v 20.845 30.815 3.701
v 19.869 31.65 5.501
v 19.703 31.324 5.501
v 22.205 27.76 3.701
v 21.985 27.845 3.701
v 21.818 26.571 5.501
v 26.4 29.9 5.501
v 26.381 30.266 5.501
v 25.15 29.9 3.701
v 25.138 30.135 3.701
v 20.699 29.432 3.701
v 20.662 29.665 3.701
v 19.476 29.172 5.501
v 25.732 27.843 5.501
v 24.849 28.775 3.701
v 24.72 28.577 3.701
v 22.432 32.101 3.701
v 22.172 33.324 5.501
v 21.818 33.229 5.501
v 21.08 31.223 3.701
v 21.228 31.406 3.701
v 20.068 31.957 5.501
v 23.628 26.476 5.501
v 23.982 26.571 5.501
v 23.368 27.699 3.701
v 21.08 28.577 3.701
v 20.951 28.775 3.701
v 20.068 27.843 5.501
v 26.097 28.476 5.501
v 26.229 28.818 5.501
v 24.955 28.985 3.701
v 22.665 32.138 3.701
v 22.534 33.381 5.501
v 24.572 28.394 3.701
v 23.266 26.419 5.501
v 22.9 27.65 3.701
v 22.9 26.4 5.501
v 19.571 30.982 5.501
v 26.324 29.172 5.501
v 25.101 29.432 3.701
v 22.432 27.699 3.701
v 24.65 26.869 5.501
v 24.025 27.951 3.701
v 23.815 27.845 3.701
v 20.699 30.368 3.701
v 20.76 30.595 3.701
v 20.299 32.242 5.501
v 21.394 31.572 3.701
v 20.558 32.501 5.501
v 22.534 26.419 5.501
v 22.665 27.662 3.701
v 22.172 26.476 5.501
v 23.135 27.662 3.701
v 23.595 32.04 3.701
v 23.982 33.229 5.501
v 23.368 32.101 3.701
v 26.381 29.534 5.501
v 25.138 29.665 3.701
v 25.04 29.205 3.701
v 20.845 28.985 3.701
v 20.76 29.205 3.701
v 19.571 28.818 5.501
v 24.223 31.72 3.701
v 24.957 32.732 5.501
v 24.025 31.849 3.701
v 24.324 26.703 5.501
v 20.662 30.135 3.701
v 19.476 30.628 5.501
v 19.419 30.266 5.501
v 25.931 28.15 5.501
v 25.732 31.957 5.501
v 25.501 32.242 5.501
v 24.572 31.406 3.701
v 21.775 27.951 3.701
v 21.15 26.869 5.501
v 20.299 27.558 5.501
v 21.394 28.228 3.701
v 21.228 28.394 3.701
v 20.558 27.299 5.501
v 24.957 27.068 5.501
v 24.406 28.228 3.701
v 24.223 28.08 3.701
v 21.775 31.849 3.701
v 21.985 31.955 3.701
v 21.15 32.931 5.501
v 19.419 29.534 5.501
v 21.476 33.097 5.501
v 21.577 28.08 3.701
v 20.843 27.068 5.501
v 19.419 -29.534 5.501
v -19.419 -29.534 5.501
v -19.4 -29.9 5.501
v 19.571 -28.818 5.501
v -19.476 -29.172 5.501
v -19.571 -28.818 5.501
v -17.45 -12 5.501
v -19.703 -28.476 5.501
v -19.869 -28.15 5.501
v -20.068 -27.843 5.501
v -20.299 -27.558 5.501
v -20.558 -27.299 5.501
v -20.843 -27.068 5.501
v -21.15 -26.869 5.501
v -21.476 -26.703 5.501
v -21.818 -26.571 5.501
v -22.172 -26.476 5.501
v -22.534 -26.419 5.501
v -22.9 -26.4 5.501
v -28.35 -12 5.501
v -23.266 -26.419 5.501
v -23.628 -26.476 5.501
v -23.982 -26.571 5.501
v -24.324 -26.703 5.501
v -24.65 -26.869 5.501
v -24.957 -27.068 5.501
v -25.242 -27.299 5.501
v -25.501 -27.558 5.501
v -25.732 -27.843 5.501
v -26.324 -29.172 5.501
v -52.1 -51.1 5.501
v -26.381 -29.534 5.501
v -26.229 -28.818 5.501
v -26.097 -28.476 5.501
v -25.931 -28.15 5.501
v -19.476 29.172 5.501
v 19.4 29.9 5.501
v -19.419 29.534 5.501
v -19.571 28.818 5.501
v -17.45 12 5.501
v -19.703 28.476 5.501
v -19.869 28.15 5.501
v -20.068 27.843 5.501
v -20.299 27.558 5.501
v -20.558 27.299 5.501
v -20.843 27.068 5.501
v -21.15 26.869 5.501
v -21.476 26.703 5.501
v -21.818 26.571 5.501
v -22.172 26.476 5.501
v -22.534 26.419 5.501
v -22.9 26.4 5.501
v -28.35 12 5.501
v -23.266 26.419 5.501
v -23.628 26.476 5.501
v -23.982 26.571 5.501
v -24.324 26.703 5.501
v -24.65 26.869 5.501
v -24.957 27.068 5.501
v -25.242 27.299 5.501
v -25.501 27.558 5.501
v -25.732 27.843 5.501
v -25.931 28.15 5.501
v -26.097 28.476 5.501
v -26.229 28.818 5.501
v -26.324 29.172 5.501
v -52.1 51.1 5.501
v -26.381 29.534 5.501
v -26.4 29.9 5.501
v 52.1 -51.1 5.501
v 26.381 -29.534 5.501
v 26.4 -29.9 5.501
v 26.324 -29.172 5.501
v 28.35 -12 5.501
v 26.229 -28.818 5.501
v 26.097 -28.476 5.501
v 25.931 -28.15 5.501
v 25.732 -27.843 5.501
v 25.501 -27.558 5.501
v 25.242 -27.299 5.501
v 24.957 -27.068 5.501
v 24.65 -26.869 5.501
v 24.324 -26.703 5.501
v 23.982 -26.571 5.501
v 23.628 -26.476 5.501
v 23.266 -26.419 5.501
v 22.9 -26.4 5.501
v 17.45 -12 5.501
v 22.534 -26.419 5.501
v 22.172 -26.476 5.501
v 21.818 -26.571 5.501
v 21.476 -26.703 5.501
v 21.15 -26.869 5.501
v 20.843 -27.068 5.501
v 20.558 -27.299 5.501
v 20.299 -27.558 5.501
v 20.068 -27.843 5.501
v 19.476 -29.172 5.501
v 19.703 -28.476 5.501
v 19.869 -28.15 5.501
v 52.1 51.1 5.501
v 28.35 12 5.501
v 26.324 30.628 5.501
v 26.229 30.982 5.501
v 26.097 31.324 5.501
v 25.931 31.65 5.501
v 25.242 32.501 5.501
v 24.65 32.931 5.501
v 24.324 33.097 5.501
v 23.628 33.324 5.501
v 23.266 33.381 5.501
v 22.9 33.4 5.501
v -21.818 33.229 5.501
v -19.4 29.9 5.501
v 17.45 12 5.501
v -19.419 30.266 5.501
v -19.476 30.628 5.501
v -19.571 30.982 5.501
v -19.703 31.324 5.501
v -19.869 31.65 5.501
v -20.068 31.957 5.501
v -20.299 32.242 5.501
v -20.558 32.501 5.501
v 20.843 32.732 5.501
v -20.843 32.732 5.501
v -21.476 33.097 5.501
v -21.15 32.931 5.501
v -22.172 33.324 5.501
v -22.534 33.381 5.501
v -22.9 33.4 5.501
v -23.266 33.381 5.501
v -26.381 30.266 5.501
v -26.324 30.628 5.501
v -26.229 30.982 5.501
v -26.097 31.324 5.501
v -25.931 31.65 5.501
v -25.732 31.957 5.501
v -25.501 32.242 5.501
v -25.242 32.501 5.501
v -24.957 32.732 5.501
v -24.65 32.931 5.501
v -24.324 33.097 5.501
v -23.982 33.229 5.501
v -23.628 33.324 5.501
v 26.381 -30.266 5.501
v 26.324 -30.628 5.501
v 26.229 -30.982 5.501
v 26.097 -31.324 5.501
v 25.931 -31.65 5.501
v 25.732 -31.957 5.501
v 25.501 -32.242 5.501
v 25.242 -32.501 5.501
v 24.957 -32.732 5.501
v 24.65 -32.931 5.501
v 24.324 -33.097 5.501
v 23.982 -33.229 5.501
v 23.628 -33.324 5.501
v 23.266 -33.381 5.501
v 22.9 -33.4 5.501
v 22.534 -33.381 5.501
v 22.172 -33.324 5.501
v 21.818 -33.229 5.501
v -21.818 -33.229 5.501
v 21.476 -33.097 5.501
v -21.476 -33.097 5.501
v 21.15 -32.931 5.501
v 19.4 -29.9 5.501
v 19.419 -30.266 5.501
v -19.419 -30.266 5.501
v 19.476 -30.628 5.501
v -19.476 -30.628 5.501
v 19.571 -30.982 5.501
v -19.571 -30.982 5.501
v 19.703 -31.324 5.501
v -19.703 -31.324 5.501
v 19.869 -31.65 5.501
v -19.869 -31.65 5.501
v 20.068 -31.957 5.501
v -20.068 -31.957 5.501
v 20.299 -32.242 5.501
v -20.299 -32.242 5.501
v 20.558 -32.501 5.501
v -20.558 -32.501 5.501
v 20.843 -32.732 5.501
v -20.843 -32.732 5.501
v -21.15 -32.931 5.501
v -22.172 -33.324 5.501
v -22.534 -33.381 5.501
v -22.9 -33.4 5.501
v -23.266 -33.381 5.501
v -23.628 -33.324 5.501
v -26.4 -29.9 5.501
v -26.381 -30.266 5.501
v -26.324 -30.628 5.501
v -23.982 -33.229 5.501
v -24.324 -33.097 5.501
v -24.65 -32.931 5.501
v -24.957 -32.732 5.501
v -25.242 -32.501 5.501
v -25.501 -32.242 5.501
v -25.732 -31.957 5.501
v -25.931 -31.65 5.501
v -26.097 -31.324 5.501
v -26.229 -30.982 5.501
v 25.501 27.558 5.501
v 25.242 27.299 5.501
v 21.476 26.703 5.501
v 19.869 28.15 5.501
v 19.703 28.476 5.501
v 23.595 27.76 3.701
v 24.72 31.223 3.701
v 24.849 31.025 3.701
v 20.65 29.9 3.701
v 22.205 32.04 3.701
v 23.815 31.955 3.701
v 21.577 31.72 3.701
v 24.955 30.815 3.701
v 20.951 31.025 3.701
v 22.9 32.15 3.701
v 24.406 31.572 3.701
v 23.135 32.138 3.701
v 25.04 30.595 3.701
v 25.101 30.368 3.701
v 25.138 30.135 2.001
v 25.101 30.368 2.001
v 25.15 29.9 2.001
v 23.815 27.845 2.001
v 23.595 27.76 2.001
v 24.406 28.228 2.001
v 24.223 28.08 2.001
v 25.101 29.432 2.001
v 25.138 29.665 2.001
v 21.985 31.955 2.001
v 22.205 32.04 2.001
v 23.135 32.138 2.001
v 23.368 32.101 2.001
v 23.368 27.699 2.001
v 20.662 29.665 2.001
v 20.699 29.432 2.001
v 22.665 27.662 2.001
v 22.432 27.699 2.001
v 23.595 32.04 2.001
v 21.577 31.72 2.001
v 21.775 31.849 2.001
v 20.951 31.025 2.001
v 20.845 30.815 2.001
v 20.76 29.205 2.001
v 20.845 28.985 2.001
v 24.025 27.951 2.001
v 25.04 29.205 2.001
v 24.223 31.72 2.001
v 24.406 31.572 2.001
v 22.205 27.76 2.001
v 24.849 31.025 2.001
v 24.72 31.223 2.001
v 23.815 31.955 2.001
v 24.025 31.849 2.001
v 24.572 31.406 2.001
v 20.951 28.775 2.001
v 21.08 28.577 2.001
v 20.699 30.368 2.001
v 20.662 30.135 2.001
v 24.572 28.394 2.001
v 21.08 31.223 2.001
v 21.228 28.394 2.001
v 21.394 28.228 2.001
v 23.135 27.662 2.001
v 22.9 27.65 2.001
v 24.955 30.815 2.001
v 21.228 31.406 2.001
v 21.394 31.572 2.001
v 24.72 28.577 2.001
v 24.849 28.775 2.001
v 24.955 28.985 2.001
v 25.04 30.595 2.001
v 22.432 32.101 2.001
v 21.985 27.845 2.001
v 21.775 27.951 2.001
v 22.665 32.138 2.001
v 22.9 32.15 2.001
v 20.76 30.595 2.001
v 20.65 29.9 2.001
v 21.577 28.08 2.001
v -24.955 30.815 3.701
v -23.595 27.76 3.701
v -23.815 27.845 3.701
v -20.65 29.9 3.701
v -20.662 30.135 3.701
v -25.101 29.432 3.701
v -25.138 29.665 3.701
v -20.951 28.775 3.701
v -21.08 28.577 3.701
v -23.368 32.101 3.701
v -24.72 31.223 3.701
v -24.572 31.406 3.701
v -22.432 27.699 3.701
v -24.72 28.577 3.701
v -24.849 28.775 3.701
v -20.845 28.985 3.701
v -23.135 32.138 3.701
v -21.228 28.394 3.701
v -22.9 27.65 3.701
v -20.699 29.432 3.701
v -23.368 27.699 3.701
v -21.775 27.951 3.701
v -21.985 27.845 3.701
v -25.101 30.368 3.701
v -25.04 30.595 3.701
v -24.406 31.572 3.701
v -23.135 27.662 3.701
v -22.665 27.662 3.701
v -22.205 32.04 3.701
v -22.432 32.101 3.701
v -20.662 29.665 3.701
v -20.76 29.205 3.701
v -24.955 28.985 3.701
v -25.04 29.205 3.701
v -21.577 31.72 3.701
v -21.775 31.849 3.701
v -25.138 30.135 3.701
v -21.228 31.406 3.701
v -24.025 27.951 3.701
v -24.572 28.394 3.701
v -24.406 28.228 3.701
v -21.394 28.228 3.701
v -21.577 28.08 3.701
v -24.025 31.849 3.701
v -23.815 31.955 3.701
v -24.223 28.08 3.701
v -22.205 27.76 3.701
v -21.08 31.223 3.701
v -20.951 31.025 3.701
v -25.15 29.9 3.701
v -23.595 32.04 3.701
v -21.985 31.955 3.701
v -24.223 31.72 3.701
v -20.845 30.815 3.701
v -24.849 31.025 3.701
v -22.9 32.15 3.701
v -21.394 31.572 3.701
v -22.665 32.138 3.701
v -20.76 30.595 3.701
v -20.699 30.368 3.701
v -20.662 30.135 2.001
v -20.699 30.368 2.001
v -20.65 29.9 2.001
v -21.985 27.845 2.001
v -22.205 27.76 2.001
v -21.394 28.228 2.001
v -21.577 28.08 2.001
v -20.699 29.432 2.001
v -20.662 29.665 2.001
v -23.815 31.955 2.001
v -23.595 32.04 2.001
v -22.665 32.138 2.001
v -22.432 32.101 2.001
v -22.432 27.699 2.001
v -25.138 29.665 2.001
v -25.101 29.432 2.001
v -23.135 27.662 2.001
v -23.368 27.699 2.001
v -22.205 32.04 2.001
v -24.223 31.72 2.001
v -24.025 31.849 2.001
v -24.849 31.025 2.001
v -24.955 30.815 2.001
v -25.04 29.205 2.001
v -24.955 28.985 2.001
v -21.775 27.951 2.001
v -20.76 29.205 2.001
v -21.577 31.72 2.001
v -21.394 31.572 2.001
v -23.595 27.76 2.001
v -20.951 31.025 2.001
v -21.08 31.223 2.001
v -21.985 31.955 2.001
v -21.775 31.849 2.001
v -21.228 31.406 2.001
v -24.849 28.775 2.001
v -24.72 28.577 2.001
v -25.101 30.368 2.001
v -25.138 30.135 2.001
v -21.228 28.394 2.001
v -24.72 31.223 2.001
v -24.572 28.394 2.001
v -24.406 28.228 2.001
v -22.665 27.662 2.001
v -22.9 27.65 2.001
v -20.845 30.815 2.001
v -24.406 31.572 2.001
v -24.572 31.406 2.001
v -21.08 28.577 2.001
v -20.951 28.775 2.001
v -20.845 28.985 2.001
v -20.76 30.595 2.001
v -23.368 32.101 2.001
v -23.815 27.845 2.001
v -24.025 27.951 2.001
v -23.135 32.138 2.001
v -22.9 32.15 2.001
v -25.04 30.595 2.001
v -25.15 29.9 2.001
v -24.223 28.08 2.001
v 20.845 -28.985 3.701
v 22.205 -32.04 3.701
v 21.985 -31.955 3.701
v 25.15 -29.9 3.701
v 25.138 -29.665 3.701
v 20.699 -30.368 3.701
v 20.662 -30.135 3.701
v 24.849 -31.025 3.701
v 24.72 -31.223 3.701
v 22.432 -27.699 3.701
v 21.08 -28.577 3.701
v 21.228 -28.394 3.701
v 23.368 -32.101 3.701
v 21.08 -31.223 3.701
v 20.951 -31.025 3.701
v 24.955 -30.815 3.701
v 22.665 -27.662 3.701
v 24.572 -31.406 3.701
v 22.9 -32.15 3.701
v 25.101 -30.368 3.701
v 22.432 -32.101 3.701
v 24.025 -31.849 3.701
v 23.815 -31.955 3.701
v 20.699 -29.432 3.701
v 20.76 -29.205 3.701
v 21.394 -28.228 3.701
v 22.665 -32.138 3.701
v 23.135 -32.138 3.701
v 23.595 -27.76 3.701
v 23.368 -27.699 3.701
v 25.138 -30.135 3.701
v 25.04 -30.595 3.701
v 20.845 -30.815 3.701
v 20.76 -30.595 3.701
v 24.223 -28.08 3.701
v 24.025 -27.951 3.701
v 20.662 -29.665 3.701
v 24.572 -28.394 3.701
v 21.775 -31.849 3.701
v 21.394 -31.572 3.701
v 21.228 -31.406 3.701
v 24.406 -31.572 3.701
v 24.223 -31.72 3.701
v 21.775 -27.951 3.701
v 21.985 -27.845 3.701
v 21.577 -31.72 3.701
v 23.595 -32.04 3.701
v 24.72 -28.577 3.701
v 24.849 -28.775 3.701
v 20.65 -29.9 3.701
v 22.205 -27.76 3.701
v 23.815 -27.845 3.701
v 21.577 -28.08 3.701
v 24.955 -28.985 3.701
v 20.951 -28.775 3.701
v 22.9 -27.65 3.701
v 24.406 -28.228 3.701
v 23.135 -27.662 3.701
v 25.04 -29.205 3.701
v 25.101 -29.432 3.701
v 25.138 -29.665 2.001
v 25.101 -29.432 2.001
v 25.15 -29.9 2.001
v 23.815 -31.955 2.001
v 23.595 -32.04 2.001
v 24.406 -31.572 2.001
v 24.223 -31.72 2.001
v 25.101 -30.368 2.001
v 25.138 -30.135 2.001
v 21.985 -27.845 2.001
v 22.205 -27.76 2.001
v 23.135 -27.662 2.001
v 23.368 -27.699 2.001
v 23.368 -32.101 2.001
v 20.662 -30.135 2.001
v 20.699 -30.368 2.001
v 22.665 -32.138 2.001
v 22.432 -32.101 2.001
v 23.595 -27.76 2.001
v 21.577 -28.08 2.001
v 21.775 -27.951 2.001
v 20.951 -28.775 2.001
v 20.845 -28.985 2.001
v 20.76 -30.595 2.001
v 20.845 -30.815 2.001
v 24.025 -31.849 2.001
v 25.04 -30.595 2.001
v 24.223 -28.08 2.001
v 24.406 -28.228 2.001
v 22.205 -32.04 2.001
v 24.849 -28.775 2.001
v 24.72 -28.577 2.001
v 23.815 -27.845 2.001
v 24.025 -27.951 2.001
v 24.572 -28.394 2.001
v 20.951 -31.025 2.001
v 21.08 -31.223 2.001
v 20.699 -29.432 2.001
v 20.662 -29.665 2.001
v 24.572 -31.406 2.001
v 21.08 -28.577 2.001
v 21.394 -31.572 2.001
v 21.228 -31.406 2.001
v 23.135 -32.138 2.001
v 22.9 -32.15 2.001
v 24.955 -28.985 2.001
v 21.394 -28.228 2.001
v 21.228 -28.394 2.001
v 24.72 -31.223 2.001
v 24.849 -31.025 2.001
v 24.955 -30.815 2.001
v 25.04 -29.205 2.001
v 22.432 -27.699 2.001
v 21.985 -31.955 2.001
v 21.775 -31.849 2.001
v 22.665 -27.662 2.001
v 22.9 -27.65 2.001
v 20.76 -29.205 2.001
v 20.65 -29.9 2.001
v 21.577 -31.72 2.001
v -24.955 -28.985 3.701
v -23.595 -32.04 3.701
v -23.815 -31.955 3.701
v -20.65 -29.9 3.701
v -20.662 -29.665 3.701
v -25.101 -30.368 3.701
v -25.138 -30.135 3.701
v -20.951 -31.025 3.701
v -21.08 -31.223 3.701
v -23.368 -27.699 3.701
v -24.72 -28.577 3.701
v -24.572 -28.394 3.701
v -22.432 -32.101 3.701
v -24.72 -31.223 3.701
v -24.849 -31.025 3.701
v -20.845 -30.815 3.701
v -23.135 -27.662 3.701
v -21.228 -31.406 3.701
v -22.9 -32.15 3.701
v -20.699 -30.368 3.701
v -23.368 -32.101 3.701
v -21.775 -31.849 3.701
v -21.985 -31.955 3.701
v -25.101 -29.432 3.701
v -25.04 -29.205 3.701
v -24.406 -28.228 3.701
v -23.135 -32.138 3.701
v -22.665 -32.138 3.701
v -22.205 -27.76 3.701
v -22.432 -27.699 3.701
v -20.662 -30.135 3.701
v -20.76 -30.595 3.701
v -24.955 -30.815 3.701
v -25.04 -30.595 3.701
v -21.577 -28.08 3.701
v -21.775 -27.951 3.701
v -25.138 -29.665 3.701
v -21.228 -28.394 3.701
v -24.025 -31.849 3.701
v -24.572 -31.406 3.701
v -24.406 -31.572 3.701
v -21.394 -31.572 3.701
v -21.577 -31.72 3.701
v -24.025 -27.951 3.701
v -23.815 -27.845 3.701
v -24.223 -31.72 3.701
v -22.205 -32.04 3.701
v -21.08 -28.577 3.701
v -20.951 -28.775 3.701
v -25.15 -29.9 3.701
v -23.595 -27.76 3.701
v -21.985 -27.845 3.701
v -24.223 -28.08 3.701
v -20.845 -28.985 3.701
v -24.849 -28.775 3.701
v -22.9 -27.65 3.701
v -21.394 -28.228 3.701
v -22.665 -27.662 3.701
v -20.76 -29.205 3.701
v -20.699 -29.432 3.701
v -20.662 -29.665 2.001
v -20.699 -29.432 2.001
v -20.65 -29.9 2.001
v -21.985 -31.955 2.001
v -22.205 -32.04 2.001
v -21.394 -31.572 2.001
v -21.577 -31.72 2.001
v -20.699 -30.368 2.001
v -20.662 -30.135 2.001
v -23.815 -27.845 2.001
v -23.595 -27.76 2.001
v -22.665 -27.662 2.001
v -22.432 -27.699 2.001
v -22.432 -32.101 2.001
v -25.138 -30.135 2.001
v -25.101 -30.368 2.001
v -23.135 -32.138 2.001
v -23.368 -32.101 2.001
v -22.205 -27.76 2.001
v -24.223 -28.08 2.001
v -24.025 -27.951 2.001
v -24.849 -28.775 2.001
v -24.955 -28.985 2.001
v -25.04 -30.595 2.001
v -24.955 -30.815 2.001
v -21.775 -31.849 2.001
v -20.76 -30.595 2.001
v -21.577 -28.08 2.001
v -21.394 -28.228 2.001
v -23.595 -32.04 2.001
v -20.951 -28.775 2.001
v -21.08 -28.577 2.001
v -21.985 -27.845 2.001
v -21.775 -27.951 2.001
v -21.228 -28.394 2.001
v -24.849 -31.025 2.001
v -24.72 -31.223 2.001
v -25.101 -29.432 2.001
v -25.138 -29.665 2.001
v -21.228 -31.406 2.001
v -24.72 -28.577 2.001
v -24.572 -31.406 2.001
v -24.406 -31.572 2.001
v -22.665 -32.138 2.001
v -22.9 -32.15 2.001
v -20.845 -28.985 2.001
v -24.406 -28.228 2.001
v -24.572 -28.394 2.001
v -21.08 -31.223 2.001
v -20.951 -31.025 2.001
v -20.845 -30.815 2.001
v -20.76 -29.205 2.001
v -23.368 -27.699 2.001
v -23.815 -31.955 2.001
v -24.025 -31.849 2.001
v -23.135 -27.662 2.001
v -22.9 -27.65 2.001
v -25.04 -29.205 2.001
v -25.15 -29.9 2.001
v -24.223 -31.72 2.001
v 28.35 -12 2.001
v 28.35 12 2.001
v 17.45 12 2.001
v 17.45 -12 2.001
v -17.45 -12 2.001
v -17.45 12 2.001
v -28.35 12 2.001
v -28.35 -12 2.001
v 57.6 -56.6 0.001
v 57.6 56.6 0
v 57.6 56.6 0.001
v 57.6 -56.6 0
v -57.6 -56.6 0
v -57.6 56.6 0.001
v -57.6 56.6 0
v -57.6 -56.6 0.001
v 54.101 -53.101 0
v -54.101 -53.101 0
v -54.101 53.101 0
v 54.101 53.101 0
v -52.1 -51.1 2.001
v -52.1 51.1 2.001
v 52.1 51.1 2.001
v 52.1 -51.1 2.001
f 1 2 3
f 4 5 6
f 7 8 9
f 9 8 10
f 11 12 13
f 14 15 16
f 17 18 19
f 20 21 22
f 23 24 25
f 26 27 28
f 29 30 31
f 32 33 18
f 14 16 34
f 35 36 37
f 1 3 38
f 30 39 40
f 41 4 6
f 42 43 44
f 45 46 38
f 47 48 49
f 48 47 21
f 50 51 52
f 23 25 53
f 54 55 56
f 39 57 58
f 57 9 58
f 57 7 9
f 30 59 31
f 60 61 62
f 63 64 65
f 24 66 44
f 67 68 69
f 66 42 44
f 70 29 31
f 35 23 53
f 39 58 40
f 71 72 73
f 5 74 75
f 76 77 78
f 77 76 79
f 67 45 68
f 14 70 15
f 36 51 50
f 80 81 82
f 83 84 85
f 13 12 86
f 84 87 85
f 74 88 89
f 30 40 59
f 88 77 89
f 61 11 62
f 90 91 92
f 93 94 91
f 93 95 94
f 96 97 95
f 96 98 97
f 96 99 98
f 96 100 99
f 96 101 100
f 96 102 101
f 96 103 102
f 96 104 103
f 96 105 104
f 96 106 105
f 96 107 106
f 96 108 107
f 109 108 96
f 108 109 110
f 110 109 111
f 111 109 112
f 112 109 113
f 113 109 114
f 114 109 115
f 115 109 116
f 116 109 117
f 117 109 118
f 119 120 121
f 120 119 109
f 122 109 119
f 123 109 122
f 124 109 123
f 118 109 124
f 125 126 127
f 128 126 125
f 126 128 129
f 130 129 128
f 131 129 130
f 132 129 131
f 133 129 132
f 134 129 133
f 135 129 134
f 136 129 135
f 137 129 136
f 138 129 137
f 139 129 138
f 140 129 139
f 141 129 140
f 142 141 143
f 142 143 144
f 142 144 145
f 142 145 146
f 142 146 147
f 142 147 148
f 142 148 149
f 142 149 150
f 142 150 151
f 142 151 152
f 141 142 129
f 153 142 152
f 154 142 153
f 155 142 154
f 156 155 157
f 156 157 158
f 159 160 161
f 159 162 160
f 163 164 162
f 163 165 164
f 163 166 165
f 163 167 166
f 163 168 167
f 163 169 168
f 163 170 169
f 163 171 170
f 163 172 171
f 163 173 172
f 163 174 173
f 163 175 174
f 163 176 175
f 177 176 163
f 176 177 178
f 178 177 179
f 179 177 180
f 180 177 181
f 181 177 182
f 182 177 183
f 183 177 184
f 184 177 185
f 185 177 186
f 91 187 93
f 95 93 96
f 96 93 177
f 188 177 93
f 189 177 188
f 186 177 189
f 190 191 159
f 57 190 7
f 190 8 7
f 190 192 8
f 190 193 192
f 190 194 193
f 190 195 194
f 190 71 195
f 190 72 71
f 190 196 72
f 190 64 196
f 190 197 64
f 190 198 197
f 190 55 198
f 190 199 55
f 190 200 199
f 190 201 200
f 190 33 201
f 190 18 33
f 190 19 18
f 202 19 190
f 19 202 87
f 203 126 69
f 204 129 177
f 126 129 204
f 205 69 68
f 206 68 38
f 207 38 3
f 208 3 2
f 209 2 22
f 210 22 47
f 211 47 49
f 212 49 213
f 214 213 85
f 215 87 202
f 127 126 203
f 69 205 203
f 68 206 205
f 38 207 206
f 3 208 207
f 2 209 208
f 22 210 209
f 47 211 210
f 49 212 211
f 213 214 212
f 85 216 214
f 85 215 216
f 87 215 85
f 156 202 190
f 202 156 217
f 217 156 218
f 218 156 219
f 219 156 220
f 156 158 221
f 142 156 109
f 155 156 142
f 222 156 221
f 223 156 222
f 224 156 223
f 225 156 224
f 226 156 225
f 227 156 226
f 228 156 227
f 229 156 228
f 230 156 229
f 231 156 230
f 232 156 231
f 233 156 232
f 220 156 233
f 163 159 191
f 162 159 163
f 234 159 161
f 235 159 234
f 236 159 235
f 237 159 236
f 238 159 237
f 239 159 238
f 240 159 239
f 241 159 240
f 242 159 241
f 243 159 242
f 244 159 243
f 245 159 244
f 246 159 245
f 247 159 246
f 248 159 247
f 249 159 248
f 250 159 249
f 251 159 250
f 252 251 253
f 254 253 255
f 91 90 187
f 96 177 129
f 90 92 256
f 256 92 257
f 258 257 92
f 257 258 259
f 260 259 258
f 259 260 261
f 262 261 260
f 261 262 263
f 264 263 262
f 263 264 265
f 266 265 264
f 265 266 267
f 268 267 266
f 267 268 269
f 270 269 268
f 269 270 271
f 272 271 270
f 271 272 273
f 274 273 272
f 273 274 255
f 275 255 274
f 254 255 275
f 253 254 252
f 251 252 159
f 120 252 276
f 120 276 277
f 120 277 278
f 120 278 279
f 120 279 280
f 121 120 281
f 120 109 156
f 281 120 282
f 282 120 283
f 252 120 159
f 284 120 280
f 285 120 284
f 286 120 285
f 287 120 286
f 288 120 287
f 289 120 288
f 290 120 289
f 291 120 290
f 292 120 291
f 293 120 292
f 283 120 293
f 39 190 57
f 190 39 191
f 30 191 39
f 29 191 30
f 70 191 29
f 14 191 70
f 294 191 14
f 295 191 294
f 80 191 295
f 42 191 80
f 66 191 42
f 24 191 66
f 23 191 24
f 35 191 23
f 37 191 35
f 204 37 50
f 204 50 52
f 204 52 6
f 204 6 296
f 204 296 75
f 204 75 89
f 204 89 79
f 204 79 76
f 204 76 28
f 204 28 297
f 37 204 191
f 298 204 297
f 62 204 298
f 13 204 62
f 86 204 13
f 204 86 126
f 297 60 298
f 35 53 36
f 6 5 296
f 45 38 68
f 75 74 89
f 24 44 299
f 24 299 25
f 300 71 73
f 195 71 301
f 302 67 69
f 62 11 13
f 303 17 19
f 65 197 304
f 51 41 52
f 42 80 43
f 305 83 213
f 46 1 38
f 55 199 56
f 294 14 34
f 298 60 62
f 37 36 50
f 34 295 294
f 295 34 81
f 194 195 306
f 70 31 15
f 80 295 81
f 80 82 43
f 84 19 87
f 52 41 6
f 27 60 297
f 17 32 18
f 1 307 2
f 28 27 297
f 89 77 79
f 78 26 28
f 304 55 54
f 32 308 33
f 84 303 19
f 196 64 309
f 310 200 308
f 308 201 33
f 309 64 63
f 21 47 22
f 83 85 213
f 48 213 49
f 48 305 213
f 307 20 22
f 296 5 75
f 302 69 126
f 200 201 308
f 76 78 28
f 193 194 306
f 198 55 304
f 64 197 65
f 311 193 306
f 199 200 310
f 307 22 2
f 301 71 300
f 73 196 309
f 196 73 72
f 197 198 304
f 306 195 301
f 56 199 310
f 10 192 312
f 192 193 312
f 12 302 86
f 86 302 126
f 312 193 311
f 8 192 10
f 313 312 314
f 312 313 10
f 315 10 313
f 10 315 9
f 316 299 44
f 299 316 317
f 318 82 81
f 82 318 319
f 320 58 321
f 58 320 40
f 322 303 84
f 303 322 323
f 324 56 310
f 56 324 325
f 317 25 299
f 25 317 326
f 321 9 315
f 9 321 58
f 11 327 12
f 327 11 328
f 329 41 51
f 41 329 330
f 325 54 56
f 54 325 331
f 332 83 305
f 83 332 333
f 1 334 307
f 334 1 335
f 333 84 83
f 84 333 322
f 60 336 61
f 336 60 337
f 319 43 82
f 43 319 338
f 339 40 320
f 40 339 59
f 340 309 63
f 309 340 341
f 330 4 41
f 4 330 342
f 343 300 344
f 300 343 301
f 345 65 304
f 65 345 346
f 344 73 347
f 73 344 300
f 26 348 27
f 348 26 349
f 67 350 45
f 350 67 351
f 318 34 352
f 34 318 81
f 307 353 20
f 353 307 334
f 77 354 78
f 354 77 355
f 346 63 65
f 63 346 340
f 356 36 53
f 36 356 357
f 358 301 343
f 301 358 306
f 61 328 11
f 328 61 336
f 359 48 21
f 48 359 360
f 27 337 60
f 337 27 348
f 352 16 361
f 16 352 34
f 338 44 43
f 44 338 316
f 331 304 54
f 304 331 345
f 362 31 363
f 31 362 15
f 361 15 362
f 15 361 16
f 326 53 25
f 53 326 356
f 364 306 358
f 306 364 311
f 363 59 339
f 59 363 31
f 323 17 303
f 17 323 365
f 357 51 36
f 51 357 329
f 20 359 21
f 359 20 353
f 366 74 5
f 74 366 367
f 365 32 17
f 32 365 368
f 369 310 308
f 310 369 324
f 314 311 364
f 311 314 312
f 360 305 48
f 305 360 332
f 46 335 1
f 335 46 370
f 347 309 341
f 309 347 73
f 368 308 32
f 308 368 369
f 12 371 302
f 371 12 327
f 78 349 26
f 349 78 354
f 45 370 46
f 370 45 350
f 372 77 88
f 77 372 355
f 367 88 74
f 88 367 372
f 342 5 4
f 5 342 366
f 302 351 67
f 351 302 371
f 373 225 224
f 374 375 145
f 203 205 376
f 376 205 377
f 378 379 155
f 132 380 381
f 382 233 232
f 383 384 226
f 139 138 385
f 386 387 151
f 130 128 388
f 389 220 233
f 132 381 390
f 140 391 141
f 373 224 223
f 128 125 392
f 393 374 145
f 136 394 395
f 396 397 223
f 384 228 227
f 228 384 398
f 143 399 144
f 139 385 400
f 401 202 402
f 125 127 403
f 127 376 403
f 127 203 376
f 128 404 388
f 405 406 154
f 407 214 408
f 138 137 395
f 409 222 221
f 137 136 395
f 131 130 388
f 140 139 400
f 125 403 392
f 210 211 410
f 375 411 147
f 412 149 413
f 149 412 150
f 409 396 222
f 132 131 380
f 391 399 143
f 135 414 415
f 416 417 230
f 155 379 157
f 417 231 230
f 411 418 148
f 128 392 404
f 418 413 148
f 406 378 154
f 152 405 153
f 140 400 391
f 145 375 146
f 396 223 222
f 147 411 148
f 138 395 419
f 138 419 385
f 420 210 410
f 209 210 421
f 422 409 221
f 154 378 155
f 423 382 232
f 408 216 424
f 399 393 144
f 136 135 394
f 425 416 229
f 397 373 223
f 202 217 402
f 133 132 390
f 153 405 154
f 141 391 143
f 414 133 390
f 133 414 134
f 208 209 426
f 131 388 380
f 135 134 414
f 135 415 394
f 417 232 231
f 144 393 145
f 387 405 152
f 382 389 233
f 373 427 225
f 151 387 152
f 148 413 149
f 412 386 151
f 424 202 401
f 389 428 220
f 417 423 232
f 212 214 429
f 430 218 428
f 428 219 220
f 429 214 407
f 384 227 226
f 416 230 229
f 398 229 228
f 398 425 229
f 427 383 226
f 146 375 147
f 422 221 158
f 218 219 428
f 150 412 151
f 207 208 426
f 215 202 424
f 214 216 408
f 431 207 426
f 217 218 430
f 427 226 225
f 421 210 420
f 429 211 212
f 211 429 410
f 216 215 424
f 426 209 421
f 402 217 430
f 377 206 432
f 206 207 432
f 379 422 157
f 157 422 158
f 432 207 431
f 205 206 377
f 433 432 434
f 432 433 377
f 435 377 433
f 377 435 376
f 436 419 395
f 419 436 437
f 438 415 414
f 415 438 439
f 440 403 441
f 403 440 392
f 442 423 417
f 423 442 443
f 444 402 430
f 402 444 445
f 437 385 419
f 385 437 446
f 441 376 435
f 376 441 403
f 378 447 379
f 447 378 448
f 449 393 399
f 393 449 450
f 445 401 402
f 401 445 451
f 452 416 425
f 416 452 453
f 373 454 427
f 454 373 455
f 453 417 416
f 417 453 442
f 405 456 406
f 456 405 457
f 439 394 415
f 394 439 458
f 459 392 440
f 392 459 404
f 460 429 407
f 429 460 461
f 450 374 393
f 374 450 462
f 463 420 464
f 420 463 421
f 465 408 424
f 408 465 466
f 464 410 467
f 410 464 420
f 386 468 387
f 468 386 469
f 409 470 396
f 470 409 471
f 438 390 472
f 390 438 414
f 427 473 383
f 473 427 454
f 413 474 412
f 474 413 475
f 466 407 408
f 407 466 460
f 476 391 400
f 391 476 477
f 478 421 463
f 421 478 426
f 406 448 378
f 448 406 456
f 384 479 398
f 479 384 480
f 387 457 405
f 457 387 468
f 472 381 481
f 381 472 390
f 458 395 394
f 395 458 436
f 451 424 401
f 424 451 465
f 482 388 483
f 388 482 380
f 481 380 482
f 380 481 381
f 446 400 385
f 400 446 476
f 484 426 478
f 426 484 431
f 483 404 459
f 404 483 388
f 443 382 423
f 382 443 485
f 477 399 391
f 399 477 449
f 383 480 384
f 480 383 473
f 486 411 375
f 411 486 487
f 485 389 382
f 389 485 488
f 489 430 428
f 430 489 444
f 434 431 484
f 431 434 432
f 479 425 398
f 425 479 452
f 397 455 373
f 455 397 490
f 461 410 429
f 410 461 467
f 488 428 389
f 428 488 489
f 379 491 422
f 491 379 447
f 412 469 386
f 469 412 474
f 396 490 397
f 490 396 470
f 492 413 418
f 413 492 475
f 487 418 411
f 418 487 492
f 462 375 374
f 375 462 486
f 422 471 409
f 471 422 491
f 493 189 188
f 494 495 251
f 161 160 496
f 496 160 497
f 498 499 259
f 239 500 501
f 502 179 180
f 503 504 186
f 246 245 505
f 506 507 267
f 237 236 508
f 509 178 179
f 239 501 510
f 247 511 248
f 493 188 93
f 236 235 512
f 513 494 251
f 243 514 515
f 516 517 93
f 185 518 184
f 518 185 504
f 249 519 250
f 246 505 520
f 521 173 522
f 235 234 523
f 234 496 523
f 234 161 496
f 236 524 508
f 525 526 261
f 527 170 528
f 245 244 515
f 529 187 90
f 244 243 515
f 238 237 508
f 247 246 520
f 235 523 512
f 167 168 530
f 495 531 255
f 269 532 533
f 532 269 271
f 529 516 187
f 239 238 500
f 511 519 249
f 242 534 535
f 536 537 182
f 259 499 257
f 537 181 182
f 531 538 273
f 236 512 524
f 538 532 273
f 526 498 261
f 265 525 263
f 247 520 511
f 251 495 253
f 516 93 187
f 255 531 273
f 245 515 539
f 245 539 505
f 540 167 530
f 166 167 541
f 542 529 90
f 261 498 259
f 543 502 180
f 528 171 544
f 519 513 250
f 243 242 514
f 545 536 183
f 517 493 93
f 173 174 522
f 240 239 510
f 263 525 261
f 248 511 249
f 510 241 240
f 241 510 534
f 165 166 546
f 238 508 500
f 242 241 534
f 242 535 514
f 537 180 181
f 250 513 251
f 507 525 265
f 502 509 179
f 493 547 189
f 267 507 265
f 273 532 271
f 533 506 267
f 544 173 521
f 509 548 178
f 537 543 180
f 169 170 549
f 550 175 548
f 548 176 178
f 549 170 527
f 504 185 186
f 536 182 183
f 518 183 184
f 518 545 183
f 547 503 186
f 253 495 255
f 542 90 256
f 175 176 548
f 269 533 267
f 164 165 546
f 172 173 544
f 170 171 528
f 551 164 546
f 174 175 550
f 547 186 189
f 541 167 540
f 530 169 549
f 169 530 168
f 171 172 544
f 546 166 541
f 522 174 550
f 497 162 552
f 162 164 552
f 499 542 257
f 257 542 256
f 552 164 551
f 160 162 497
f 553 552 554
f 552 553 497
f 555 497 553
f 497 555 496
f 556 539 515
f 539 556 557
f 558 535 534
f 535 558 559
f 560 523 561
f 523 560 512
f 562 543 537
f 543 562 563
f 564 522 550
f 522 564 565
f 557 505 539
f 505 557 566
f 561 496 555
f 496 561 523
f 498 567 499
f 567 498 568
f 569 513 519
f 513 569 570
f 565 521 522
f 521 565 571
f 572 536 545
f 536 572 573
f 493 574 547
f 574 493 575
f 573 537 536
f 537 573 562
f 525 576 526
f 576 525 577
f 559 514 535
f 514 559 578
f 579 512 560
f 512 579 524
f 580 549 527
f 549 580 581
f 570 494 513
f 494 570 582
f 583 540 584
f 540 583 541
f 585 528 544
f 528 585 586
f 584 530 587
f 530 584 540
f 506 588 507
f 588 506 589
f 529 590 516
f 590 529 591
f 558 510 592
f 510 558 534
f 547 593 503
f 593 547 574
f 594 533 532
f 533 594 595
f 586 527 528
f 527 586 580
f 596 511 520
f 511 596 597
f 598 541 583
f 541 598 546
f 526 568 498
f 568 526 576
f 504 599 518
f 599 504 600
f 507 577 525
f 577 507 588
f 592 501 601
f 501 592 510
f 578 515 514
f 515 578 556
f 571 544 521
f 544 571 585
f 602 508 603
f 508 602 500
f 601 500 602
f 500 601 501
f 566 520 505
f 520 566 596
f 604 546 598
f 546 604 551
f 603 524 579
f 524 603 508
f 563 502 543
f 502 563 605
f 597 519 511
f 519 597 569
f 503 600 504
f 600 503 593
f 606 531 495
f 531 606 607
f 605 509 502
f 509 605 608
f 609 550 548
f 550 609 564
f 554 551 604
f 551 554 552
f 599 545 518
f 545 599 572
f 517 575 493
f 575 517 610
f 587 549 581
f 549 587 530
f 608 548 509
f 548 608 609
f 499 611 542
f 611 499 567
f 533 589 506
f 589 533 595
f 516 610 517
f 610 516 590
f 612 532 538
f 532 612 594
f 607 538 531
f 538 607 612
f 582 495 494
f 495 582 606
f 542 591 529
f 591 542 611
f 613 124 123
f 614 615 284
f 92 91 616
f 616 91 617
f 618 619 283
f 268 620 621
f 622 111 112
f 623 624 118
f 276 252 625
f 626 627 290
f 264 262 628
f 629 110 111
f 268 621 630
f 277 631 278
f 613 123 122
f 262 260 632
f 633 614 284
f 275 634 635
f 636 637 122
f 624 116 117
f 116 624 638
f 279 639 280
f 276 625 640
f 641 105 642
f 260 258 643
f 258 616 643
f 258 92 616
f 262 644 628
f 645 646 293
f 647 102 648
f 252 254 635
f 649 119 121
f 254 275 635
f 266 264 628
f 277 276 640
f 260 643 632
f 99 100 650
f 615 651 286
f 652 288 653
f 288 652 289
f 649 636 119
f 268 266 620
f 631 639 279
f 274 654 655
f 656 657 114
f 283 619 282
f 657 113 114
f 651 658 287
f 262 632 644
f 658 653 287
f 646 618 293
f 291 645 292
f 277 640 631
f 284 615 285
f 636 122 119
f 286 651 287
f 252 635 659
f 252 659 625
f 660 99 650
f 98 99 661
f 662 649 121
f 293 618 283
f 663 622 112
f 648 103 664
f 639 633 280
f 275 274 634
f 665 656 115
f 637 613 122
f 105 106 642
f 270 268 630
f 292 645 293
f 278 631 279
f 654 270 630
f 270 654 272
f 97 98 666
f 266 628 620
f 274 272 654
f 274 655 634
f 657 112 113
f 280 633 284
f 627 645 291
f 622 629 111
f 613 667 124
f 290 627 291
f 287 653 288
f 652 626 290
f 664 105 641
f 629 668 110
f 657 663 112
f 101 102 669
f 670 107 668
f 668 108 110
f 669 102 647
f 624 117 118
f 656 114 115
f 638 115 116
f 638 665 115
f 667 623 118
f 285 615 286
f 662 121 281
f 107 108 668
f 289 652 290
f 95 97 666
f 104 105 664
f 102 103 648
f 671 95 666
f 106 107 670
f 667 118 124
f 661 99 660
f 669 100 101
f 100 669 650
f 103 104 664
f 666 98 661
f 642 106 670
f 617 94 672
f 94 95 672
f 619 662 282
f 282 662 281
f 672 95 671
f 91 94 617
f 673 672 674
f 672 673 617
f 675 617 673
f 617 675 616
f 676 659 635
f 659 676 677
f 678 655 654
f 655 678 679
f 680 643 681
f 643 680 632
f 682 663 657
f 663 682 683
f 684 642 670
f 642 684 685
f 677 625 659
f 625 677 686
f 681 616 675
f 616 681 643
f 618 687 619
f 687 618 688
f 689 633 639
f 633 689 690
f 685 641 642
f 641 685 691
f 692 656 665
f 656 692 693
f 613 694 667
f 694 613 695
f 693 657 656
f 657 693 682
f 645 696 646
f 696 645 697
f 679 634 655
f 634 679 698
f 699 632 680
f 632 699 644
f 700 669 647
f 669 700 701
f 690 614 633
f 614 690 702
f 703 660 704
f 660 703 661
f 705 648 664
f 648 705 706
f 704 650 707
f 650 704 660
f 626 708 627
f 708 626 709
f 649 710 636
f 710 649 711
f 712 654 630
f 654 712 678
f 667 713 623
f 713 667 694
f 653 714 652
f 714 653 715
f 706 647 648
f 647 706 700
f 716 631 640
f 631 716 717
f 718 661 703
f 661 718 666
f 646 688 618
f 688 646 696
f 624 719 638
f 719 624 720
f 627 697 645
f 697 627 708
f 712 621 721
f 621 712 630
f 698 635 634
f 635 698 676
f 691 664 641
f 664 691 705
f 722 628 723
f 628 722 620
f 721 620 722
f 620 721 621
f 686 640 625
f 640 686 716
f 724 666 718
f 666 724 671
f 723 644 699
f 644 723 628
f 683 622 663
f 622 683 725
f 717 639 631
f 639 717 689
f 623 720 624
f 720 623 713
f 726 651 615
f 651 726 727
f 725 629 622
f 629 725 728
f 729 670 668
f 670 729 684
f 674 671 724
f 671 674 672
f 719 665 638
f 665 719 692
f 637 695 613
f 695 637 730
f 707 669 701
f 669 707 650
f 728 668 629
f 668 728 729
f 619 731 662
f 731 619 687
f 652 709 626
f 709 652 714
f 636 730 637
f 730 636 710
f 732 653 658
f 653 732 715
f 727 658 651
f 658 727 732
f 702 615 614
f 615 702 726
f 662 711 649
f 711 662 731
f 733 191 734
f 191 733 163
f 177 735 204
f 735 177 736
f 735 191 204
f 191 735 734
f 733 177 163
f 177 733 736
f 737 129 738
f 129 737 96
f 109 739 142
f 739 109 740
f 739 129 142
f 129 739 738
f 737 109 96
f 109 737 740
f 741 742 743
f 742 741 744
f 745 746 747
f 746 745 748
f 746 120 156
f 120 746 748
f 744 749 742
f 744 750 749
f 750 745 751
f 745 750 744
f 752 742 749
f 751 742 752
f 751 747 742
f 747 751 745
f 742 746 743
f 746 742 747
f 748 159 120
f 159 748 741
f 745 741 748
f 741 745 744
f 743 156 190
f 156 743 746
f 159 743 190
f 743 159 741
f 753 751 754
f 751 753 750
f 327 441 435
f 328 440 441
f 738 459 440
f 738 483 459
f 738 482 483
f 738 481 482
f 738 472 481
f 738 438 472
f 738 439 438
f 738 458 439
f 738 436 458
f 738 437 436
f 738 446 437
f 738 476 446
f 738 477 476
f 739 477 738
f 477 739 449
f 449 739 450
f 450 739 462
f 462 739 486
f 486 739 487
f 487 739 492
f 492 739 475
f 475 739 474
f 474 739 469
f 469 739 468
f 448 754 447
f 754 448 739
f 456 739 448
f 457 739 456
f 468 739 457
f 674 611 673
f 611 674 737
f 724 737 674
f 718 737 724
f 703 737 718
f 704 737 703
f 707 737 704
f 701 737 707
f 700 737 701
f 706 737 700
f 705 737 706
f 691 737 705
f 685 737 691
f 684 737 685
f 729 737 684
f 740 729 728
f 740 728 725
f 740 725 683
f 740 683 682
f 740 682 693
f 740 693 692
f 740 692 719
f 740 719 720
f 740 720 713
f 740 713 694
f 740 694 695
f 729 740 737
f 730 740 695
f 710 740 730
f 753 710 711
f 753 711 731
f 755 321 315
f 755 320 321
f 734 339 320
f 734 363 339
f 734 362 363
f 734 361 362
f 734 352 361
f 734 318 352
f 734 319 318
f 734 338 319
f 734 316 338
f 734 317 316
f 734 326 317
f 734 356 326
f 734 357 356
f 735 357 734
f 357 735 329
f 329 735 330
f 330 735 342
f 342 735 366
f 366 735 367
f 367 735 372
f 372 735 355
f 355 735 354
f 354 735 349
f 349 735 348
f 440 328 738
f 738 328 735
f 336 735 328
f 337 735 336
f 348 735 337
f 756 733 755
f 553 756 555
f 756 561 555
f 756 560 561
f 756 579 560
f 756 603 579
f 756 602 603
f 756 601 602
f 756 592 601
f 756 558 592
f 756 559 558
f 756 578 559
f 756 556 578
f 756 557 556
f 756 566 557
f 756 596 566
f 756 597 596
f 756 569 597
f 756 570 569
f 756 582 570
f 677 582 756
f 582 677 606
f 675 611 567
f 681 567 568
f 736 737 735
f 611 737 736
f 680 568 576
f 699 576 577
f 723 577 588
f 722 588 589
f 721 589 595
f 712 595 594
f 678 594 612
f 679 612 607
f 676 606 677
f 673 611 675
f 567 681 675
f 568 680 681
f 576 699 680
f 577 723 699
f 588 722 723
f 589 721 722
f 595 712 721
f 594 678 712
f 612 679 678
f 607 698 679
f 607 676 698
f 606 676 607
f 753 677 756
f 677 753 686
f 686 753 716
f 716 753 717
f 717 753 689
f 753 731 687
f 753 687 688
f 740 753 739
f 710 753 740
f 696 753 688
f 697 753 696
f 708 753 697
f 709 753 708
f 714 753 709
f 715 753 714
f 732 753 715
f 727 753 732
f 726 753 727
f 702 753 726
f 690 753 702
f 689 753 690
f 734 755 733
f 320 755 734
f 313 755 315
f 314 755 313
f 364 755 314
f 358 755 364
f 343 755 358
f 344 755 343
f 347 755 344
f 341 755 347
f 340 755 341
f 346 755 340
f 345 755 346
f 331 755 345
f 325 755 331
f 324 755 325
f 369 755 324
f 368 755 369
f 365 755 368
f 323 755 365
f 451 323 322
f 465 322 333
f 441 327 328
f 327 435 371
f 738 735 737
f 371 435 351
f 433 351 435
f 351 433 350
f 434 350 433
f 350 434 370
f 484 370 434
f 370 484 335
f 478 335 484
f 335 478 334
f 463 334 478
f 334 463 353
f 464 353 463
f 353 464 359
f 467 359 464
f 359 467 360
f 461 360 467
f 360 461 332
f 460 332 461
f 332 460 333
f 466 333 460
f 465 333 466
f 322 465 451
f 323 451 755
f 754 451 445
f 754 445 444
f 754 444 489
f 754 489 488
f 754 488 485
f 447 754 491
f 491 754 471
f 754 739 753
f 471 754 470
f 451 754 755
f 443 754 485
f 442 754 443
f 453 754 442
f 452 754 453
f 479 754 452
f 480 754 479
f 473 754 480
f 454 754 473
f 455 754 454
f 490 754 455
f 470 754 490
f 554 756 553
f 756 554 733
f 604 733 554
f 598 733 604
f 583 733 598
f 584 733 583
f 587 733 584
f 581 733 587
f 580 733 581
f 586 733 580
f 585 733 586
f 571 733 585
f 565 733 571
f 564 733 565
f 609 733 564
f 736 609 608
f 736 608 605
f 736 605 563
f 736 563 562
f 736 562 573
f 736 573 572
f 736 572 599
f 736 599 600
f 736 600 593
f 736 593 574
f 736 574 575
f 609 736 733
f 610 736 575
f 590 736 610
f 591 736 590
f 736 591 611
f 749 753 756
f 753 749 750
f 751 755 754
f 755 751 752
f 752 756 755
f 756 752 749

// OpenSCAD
// Light switch cover (body parameters)
cover_w=115.2; // Cover width
cover_l=113.2; // Cover length
cover_h=5.5; // Cover height
cover_thick=3.5; // Cover thickness
grad_dist=cover_h; // Edge taper distance

// Switch hole parameters
switch_hole_l=10.9; // Switch hole length
switch_hole_w=24.0; // Switch hole width
switch_hole_sep=34.9; // Dist between switch holes

// Screw hole parameters
screw_dist_from_hole_top=14.4; // Dist from top of switch hole
screw_hole_rad_upper=7.0/2; // Upper screw radius
screw_hole_rad_lower=4.5/2; // Lower screw radius
screw_grad_dist=1.8; // Screw inset distance

module wantCube(l, w, h) {
    translate([-w/2,-l/2,0])
        cube([w, l, h]);
}

module wantRect(l, w) {
    translate([-l/2,-w/2,0])
    square([l, w]);
}

module switch_body() {
    hull() {
        wantCube(cover_l, cover_w, 0.001);
        translate([0,0,cover_h])
        wantCube(cover_l-2*grad_dist, cover_w-2*grad_dist, 0.001);
    }
}

module switch_hole() {
    wantCube(switch_hole_w, switch_hole_l, 30);
}

module switch_holes() {
    x=switch_hole_sep/2+switch_hole_l/2;
    translate([x,0,-15])
        switch_hole();
    translate([-x,0,-15])
        switch_hole();
}

module screw_hole() {
    union() {
        translate([0,0,cover_h-screw_grad_dist+0.001])
            cylinder(h=screw_grad_dist, r2=screw_hole_rad_upper, r1=screw_hole_rad_lower, $fn=60);
        translate([0,0,cover_h-20])
            cylinder(h=20, r=screw_hole_rad_lower, $fn=60);
    }
}

module screw_holes() {
    y=screw_dist_from_hole_top+screw_hole_rad_upper+switch_hole_w/2;
    x=switch_hole_sep/2+switch_hole_l/2;
    translate([x,y,0])
        screw_hole();
    translate([-x,y,0])
        screw_hole();
    translate([x,-y,0])
        screw_hole();
    translate([-x,-y,0])
        screw_hole();
}

module switch_cover_final() {
    difference() {
        switch_body();
        translate([0,0,-cover_thick])
            switch_body();
        screw_holes();
        switch_holes();
    }
}

switch_cover_final();
